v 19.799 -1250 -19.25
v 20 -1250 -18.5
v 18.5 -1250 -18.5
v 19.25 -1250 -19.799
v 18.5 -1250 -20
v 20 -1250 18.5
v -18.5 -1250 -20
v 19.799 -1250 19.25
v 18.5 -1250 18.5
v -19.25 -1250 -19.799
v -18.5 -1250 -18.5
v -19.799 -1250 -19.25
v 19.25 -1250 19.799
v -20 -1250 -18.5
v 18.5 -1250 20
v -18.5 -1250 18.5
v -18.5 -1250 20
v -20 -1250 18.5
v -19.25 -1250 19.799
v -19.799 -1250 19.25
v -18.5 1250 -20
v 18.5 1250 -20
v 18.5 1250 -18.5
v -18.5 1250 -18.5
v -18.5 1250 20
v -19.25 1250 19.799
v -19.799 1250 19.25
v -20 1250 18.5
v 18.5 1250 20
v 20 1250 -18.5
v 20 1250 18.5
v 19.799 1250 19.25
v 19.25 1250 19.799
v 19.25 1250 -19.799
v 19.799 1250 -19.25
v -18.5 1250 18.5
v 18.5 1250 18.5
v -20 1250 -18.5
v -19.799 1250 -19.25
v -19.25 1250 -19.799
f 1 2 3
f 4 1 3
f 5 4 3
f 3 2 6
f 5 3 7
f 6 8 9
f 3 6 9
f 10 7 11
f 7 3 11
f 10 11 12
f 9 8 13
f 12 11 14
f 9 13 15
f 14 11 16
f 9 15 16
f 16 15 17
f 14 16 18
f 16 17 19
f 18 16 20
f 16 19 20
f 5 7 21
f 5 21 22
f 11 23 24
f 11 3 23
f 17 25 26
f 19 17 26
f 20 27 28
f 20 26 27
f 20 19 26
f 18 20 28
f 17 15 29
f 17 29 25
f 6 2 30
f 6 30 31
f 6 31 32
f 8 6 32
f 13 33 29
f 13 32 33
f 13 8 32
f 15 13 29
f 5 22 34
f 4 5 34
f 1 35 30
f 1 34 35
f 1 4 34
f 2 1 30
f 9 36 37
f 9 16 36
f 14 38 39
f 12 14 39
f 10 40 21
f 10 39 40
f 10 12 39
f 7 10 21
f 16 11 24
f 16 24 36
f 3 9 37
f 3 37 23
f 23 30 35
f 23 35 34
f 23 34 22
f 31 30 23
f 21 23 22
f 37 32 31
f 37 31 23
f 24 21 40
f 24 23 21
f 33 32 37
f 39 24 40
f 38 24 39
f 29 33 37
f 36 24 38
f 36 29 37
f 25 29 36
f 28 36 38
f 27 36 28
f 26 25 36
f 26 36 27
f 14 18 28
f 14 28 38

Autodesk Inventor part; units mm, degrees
ref_plane "YZ Plane" through (0, 0, 0) normal (1, 0, 0) x (0, 1, 0)
ref_plane "XZ Plane" through (0, 0, 0) normal (0, 1, 0) x (-1, 0, 0)
ref_plane "XY Plane" through (0, 0, 0) normal (0, 0, 1) x (1, 0, 0)
sketch "Esboço1" plane through (0, 0, 0) normal (0, 1, 0) x (-1, 0, 0)
  line L0 (-18.5, 20) -> (18.5, 20)
  line L1 (20, 18.5) -> (20, -18.5)
  line L2 (18.5, -20) -> (-18.5, -20)
  line L3 (-20, -18.5) -> (-20, 18.5)
  line L4 (-20, 20) -> (20, -20) construction
  line L5 (20, 20) -> (-20, -20) construction
  line L6 (-18.5, -18.5) -> (18.5, -18.5)
  line L7 (18.5, -18.5) -> (18.5, 18.5)
  line L8 (18.5, 18.5) -> (-18.5, 18.5)
  line L9 (-18.5, 18.5) -> (-18.5, -18.5)
  line L10 (-18.5, -18.5) -> (18.5, 18.5) construction
  line L11 (18.5, -18.5) -> (-18.5, 18.5) construction
  arc A0 (20, 18.5) -> (18.5, 20) centre (18.5, 18.5) ccw
  arc A1 (-18.5, 20) -> (-20, 18.5) centre (-18.5, 18.5) ccw
  arc A2 (-20, -18.5) -> (-18.5, -20) centre (-18.5, -18.5) ccw
  arc A3 (18.5, -20) -> (20, -18.5) centre (18.5, -18.5) ccw
  point P0 (0, 0)
  dimension "d0" = 40
  dimension "d1" = 40
  dimension "d2" = 1.5
  dimension "d3" = 1.5
extrude "Extrusão1" add sketch "Esboço1" along normal mid plane 2500
equation "\"d3\" = d2"
properties part number "MSI-102" material "Aço inoxidável AISI 304"
